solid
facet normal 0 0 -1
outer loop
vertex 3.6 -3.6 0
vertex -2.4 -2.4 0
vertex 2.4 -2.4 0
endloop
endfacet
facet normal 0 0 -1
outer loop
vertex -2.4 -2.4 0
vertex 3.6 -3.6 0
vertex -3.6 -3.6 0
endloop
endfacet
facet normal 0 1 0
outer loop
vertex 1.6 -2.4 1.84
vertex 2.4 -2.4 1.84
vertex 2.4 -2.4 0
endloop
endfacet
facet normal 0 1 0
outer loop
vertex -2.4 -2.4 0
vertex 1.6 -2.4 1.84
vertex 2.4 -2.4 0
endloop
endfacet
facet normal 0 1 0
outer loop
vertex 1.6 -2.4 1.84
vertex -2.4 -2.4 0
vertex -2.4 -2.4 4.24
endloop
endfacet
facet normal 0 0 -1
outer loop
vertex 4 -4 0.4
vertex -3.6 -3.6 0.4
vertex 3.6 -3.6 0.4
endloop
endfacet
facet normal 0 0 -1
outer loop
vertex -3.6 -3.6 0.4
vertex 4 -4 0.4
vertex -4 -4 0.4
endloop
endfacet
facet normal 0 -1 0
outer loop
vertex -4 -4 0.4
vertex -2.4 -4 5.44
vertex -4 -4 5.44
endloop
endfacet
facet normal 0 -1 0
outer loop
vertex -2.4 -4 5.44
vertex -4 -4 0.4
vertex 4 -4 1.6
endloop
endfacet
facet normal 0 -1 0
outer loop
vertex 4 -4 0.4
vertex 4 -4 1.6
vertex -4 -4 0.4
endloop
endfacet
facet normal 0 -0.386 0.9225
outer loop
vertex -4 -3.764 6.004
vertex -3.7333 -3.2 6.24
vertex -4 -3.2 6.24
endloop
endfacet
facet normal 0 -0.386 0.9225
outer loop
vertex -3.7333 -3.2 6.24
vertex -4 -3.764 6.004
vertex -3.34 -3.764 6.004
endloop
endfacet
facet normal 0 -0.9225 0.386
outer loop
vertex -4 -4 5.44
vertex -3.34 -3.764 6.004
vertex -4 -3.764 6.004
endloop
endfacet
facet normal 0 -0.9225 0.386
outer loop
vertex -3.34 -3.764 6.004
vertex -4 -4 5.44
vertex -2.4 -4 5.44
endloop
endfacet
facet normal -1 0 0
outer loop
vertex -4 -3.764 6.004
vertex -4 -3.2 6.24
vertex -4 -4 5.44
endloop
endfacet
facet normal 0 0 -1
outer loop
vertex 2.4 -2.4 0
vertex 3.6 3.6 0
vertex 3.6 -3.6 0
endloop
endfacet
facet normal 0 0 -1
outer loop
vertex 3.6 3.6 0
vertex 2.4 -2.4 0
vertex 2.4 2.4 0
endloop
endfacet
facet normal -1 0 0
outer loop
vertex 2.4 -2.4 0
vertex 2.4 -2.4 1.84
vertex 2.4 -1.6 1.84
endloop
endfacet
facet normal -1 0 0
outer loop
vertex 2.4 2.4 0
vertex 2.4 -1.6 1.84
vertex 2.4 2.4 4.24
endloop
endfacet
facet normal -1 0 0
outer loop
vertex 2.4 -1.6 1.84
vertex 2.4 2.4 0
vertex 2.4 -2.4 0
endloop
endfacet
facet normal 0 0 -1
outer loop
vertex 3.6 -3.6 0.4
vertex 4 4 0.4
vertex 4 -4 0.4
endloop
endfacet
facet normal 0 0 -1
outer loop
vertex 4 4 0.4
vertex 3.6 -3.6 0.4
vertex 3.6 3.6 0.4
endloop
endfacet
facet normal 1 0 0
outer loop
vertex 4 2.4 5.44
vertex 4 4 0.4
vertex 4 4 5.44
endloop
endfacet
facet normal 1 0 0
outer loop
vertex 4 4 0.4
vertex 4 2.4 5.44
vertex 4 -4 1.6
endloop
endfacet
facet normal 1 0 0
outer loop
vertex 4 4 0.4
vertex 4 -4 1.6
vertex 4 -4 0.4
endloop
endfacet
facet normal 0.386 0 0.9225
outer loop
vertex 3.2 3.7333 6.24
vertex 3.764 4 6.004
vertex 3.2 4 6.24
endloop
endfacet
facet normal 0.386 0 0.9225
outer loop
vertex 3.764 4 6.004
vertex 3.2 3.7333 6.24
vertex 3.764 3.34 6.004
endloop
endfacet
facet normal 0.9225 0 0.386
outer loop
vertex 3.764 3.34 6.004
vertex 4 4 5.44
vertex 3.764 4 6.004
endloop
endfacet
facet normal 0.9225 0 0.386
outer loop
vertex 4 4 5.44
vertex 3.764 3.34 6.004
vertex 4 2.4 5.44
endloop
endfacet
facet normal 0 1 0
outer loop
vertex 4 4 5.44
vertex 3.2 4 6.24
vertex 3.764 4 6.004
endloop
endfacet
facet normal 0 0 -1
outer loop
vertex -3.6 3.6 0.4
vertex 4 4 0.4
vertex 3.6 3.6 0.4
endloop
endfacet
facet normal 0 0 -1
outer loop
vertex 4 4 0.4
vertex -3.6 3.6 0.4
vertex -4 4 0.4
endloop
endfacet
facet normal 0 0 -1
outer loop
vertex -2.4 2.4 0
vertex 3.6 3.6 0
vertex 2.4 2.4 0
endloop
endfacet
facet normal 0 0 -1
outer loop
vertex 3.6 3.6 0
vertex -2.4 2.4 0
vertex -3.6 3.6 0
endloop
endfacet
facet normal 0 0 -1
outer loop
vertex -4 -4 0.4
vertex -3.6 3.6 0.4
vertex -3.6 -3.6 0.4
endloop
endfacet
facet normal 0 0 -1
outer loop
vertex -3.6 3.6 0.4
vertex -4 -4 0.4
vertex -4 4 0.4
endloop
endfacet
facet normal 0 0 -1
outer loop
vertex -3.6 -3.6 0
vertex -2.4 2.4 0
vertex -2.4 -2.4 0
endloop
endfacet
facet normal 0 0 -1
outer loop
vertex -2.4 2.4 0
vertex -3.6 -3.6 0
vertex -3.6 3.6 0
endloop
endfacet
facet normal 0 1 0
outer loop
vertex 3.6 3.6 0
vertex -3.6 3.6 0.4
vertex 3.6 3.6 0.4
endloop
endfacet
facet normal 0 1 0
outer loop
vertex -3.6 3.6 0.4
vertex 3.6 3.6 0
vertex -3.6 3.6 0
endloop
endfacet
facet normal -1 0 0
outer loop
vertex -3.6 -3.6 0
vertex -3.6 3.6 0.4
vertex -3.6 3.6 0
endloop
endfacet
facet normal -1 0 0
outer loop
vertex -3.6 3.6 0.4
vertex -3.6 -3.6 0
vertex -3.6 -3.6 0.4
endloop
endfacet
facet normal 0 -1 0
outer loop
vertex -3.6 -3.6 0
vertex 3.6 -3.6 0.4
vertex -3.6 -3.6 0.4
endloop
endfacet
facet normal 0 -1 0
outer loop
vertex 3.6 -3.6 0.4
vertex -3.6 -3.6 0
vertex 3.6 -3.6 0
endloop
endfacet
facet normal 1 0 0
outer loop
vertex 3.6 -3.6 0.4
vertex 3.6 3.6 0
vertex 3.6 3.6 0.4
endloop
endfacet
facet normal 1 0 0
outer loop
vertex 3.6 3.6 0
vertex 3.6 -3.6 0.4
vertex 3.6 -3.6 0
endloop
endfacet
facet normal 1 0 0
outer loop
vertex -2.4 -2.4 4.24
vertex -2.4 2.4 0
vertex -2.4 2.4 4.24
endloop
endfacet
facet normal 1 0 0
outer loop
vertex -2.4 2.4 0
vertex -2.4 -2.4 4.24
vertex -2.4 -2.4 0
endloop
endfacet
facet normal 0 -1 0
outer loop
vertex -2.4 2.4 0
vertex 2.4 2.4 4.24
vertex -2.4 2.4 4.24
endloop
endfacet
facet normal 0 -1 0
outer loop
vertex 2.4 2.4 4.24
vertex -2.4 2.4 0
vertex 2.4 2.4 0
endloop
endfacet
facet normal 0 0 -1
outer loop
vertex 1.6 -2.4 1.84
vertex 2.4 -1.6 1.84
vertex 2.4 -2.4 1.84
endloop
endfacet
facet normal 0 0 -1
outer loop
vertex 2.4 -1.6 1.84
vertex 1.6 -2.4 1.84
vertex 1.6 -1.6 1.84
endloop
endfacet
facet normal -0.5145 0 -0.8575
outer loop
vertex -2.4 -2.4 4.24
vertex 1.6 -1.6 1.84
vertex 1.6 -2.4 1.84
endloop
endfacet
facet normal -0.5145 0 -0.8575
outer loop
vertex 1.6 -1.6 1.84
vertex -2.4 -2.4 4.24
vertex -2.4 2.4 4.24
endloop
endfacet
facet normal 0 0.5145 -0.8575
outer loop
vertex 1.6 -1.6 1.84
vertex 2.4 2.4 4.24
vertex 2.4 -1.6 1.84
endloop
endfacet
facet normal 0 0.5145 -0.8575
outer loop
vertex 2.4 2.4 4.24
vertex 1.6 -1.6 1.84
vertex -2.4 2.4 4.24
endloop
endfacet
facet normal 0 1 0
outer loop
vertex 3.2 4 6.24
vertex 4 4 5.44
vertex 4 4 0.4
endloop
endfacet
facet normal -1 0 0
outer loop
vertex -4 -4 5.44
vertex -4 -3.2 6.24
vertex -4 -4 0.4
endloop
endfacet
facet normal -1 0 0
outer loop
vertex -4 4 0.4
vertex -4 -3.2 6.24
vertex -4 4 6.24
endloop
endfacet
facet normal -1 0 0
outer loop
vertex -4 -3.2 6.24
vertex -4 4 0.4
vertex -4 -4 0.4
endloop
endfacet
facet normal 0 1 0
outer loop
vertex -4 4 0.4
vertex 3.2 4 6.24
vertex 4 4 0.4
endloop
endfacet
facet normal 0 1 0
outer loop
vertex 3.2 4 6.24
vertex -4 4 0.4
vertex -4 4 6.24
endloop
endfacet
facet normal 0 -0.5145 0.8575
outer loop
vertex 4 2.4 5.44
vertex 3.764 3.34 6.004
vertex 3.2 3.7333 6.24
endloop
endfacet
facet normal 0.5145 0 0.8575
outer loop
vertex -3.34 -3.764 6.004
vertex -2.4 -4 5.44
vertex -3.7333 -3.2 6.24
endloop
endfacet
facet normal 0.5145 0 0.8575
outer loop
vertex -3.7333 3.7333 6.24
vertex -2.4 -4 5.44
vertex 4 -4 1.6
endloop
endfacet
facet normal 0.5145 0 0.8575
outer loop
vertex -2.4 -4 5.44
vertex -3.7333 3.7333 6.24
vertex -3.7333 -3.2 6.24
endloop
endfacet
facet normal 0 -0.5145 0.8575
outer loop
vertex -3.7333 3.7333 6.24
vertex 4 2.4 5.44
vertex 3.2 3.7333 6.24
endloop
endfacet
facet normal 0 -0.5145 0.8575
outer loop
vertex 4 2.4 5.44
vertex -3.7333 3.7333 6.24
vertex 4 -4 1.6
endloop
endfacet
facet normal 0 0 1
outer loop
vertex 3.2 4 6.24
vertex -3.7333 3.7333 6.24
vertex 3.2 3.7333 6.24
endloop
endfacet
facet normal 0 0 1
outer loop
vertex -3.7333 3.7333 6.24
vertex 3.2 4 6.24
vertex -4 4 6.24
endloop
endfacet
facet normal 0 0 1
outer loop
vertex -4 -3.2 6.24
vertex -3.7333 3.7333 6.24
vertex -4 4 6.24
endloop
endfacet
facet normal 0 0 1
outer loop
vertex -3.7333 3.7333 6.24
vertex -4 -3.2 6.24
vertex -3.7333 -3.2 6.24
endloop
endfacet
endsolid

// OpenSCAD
// file: s/7825s03.scad
use <../../lib.scad>
function ldraw_lib__s__7825s03() = [
// 0 ~Slope Brick 31  1 x  1 x  0.667 - Side Half
// 0 Name: s\7825s03.dat
// 0 Author: Gerald Lasser [GeraldLasser]
// 0 !LDRAW_ORG Subpart UPDATE 2026-01
// 0 !LICENSE Licensed under CC BY 4.0 : see CAreadme.txt
// 
// 0 BFC CERTIFY CCW
  [0,"BFC","CERTIFY"],
  [0,"BFC","CCW"],
// 
// 0 !HISTORY 2026-01-01 [GeraldLasser] Derived from Philo's 54200
// 0 !HISTORY 2026-01-29 [OrionP] Official Update 2026-01
// 
// 0 // Bottom and Inside
// 4 16 4 0 6 4 0 -6 1 0 -9 1 0 9
  [4,16,4,0,6,4,0,-6,1,0,-9,1,0,9],
// 2 24 4 0 -6 4 0 6
  [2,24,4,0,-6,4,0,6],
// 3 16 4 -4.6 -4 4 -4.6 -6 4 0 -6
  [3,16,4,-4.6,-4,4,-4.6,-6,4,0,-6],
// 4 16 4 0 -6 4 0 6 4 -10.6 6 4 -4.6 -4
  [4,16,4,0,-6,4,0,6,4,-10.6,6,4,-4.6,-4],
// 
// 4 16 0 -1 -10 0 -1 10 1 -1 9 1 -1 -9
  [4,16,0,-1,-10,0,-1,10,1,-1,9,1,-1,-9],
// 2 24 0 -1 10 0 -1 -10
  [2,24,0,-1,10,0,-1,-10],
// 
// 0 // Outside
// 4 16 0 -13.6 6 0 -13.6 10 0 -1 10 0 -4 -10
  [4,16,0,-13.6,6,0,-13.6,10,0,-1,10,0,-4,-10],
// 3 16 0 -1 -10 0 -4 -10 0 -1 10
  [3,16,0,-1,-10,0,-4,-10,0,-1,10],
// 4 16 .59 -15.01 8.35 2 -15.6 9.3333 2 -15.6 10 .59 -15.01 10
  [4,16,.59,-15.01,8.35,2,-15.6,9.3333,2,-15.6,10,.59,-15.01,10],
// 4 16 0 -13.6 6 .59 -15.01 8.35 .59 -15.01 10 0 -13.6 10
  [4,16,0,-13.6,6,.59,-15.01,8.35,.59,-15.01,10,0,-13.6,10],
// 3 16 .59 -15.01 10 2 -15.6 10 0 -13.6 10
  [3,16,.59,-15.01,10,2,-15.6,10,0,-13.6,10],
// 2 24 0 -1 10 0 -13.6 10
  [2,24,0,-1,10,0,-13.6,10],
// 2 24 0 -13.6 6 0 -4 -10
  [2,24,0,-13.6,6,0,-4,-10],
// 2 24 .59 -15.01 8.35 0 -13.6 6
  [2,24,.59,-15.01,8.35,0,-13.6,6],
// 2 24 .59 -15.01 10 0 -13.6 10
  [2,24,.59,-15.01,10,0,-13.6,10],
// 2 24 2 -15.6 9.3333 .59 -15.01 8.35
  [2,24,2,-15.6,9.3333,.59,-15.01,8.35],
// 2 24 .59 -15.01 10 2 -15.6 10
  [2,24,.59,-15.01,10,2,-15.6,10],
// 
// 5 24 .59 -15.01 10 .59 -15.01 8.35 2 -15.6 9.3333 0 -13.6 10
  [5,24,.59,-15.01,10,.59,-15.01,8.35,2,-15.6,9.3333,0,-13.6,10],
// 5 24 0 -13.6 6 0 -13.6 10 .59 -15.01 8.35 0 -1 10
  [5,24,0,-13.6,6,0,-13.6,10,.59,-15.01,8.35,0,-1,10],
// 5 24 2 -15.6 9.3333 2 -15.6 10 .59 -15.01 10 10 -15.6 9.3333
  [5,24,2,-15.6,9.3333,2,-15.6,10,.59,-15.01,10,10,-15.6,9.3333],
];
module ldraw_lib__s__7825s03(step=0, col=false, unit=2/5, alt=false, line=0.2, solid=!$preview)
    makepoly(ldraw_lib__s__7825s03(), step=step, col=col, unit=unit, alt=alt, line=line, solid=solid);
ldraw_lib__s__7825s03(line=0.2);
// file: ../p/rect.scad
use <../lib.scad>
function ldraw_lib__rect() = [
// 0 Rectangle
// 0 Name: rect.dat
// 0 Author: James Jessiman
// 0 !LDRAW_ORG Primitive UPDATE 2010-01
// 0 !LICENSE Licensed under CC BY 4.0 : see CAreadme.txt
// 
// 0 BFC CERTIFY CCW
  [0,"BFC","CERTIFY"],
  [0,"BFC","CCW"],
// 
// 0 !HISTORY 2002-04-05 [hafhead] Added BFC statement
// 0 !HISTORY 2002-04-25 [PTadmin] Official Update 2002-02
// 0 !HISTORY 2007-06-24 [PTadmin] Header formatted for Contributor Agreement
// 0 !HISTORY 2008-07-01 [PTadmin] Official Update 2008-01
// 0 !HISTORY 2010-01-17 [mikeheide] changed winding to CCW
// 0 !HISTORY 2010-04-05 [PTadmin] Official Update 2010-01
// 
// 
// 2 24 1 0 1 -1 0 1
  [2,24,1,0,1,-1,0,1],
// 2 24 -1 0 1 -1 0 -1
  [2,24,-1,0,1,-1,0,-1],
// 2 24 -1 0 -1 1 0 -1
  [2,24,-1,0,-1,1,0,-1],
// 2 24 1 0 -1 1 0 1
  [2,24,1,0,-1,1,0,1],
// 4 16 -1 0 1 -1 0 -1 1 0 -1 1 0 1
  [4,16,-1,0,1,-1,0,-1,1,0,-1,1,0,1],
// 0
];
module ldraw_lib__rect(step=0, col=false, unit=2/5, alt=false, line=0.2, solid=!$preview)
    makepoly(ldraw_lib__rect(), step=step, col=col, unit=unit, alt=alt, line=line, solid=solid);
ldraw_lib__rect(line=0.2);
// file: ../p/box4.scad
use <../lib.scad>
function ldraw_lib__box4() = [
// 0 Box with 4 Faces (2 Parallel Pairs) and All Edges
// 0 Name: box4.dat
// 0 Author: James Jessiman
// 0 !LDRAW_ORG Primitive UPDATE 2012-01
// 0 !LICENSE Licensed under CC BY 4.0 : see CAreadme.txt
// 
// 0 BFC CERTIFY CCW
  [0,"BFC","CERTIFY"],
  [0,"BFC","CCW"],
// 
// 0 !HISTORY 2002-04-03 [sbliss] Modified for BFC compliance
// 0 !HISTORY 2002-04-25 [PTadmin] Official Update 2002-02
// 0 !HISTORY 2007-06-24 [PTadmin] Header formatted for Contributor Agreement
// 0 !HISTORY 2008-07-01 [PTadmin] Official Update 2008-01
// 0 !HISTORY 2012-02-16 [Philo] Changed to CCW
// 0 !HISTORY 2012-03-30 [PTadmin] Official Update 2012-01
// 
// 
// 2 24 1 1 1 -1 1 1
  [2,24,1,1,1,-1,1,1],
// 2 24 -1 1 1 -1 1 -1
  [2,24,-1,1,1,-1,1,-1],
// 2 24 -1 1 -1 1 1 -1
  [2,24,-1,1,-1,1,1,-1],
// 2 24 1 1 -1 1 1 1
  [2,24,1,1,-1,1,1,1],
// 2 24 1 0 1 -1 0 1
  [2,24,1,0,1,-1,0,1],
// 2 24 -1 0 1 -1 0 -1
  [2,24,-1,0,1,-1,0,-1],
// 2 24 -1 0 -1 1 0 -1
  [2,24,-1,0,-1,1,0,-1],
// 2 24 1 0 -1 1 0 1
  [2,24,1,0,-1,1,0,1],
// 2 24 1 0 1 1 1 1
  [2,24,1,0,1,1,1,1],
// 2 24 -1 0 1 -1 1 1
  [2,24,-1,0,1,-1,1,1],
// 2 24 1 0 -1 1 1 -1
  [2,24,1,0,-1,1,1,-1],
// 2 24 -1 0 -1 -1 1 -1
  [2,24,-1,0,-1,-1,1,-1],
// 4 16 -1 1 1 -1 0 1 1 0 1 1 1 1
  [4,16,-1,1,1,-1,0,1,1,0,1,1,1,1],
// 4 16 -1 1 -1 -1 0 -1 -1 0 1 -1 1 1
  [4,16,-1,1,-1,-1,0,-1,-1,0,1,-1,1,1],
// 4 16 1 1 -1 1 0 -1 -1 0 -1 -1 1 -1
  [4,16,1,1,-1,1,0,-1,-1,0,-1,-1,1,-1],
// 4 16 1 1 1 1 0 1 1 0 -1 1 1 -1
  [4,16,1,1,1,1,0,1,1,0,-1,1,1,-1],
];
module ldraw_lib__box4(step=0, col=false, unit=2/5, alt=false, line=0.2, solid=!$preview)
    makepoly(ldraw_lib__box4(), step=step, col=col, unit=unit, alt=alt, line=line, solid=solid);
ldraw_lib__box4(line=0.2);
// file: ../p/box2-5.scad
use <../lib.scad>
function ldraw_lib__box2_5() = [
// 0 Box with 2 Faces without 5 Edges
// 0 Name: box2-5.dat
// 0 Author: Steffen [Steffen]
// 0 !LDRAW_ORG Primitive UPDATE 2003-03
// 0 !LICENSE Licensed under CC BY 4.0 : see CAreadme.txt
// 
// 0 BFC CERTIFY CCW
  [0,"BFC","CERTIFY"],
  [0,"BFC","CCW"],
// 
// 0 !HISTORY 2003-12-19 [PTadmin] Official Update 2003-03
// 0 !HISTORY 2007-06-24 [PTadmin] Header formatted for Contributor Agreement
// 0 !HISTORY 2008-07-01 [PTadmin] Official Update 2008-01
// 
// 
// 2 24 1 1 1 -1 1 1
  [2,24,1,1,1,-1,1,1],
// 2 24 1 1 -1 -1 1 -1
  [2,24,1,1,-1,-1,1,-1],
// 2 24 1 -1 1 -1 -1 1
  [2,24,1,-1,1,-1,-1,1],
// 2 24 -1 -1 1 -1 1 1
  [2,24,-1,-1,1,-1,1,1],
// 2 24 1 -1 1 1 1 1
  [2,24,1,-1,1,1,1,1],
// 2 24 -1 1 -1 -1 1 1
  [2,24,-1,1,-1,-1,1,1],
// 2 24 1 1 -1 1 1 1
  [2,24,1,1,-1,1,1,1],
// 4 16 1 1 1 1 1 -1 -1 1 -1 -1 1 1
  [4,16,1,1,1,1,1,-1,-1,1,-1,-1,1,1],
// 4 16 1 1 1 -1 1 1 -1 -1 1 1 -1 1
  [4,16,1,1,1,-1,1,1,-1,-1,1,1,-1,1],
// 0
];
module ldraw_lib__box2_5(step=0, col=false, unit=2/5, alt=false, line=0.2, solid=!$preview)
    makepoly(ldraw_lib__box2_5(), step=step, col=col, unit=unit, alt=alt, line=line, solid=solid);
ldraw_lib__box2_5(line=0.2);
// main file
use <../lib.scad>
use <../p/box2-5.scad>
use <../p/box4.scad>
use <../p/rect.scad>
use <s/7825s03.scad>
function ldraw_lib__7827() = [
// 0 Slope Brick 31  1 x  1 x  0.667 Double Concave
// 0 Name: 7827.dat
// 0 Author: Gerald Lasser [GeraldLasser]
// 0 !LDRAW_ORG Part UPDATE 2026-01
// 0 !LICENSE Licensed under CC BY 4.0 : see CAreadme.txt
// 
// 0 BFC CERTIFY CCW
  [0,"BFC","CERTIFY"],
  [0,"BFC","CCW"],
// 
// 0 !KEYWORDS Brickowl 977359
// 
// 0 !HISTORY 2026-01-29 [OrionP] Official Update 2026-01
// 
// 1 16 0 0 -10 0 0 -1 0 1 0 1 0 0 s\7825s03.dat
  [1,16,0,0,-10,0,0,-1,0,1,0,1,0,0, ldraw_lib__s__7825s03()],
// 1 16 10 0 0 -1 0 0 0 1 0 0 0 1 s\7825s03.dat
  [1,16,10,0,0,-1,0,0,0,1,0,0,0,1, ldraw_lib__s__7825s03()],
// 
// 0 // Inside and Bottom
// 4 16 -9 -1 9 -10 -1 10 10 -1 10 9 -1 9
  [4,16,-9,-1,9,-10,-1,10,10,-1,10,9,-1,9],
// 4 16 9 0 9 6 0 6 -6 0 6 -9 0 9
  [4,16,9,0,9,6,0,6,-6,0,6,-9,0,9],
// 4 16 -10 -1 -10 -10 -1 10 -9 -1 9 -9 -1 -9
  [4,16,-10,-1,-10,-10,-1,10,-9,-1,9,-9,-1,-9],
// 4 16 -6 0 6 -6 0 -6 -9 0 -9 -9 0 9
  [4,16,-6,0,6,-6,0,-6,-9,0,-9,-9,0,9],
// 1 16 0 -1 0 9 0 0 0 1 0 0 0 9 box4.dat
  [1,16,0,-1,0,9,0,0,0,1,0,0,0,9, ldraw_lib__box4()],
// 0 BFC INVERTNEXT
  [0,"BFC","INVERTNEXT"],
// 1 16 0 -5.3 0 0 -6 0 5.3 0 0 0 0 6 box2-5.dat
  [1,16,0,-5.3,0,0,-6,0,5.3,0,0,0,0,6, ldraw_lib__box2_5()],
// 
// 1 16 5 -4.6 -5 1 0 0 0 -1 0 0 0 1 rect.dat
  [1,16,5,-4.6,-5,1,0,0,0,-1,0,0,0,1, ldraw_lib__rect()],
// 4 16 -6 -10.6 -6 -6 -10.6 6 4 -4.6 -4 4 -4.6 -6
  [4,16,-6,-10.6,-6,-6,-10.6,6,4,-4.6,-4,4,-4.6,-6],
// 4 16 6 -4.6 -4 4 -4.6 -4 -6 -10.6 6 6 -10.6 6
  [4,16,6,-4.6,-4,4,-4.6,-4,-6,-10.6,6,6,-10.6,6],
// 2 24 4 -4.6 -4 -6 -10.6 6
  [2,24,4,-4.6,-4,-6,-10.6,6],
// 2 24 4 -4.6 -6 -6 -10.6 -6
  [2,24,4,-4.6,-6,-6,-10.6,-6],
// 2 24 6 -4.6 -4 6 -10.6 6
  [2,24,6,-4.6,-4,6,-10.6,6],
// 2 24 6 -4.6 -6 6 0 -6
  [2,24,6,-4.6,-6,6,0,-6],
// 
// 0 // Outside
// 3 16 8 -15.6 10 10 -13.6 10 10 -1 10
  [3,16,8,-15.6,10,10,-13.6,10,10,-1,10],
// 3 16 -10 -13.6 -10 -10 -15.6 -8 -10 -1 -10
  [3,16,-10,-13.6,-10,-10,-15.6,-8,-10,-1,-10],
// 4 16 -10 -1 10 -10 -1 -10 -10 -15.6 -8 -10 -15.6 10
  [4,16,-10,-1,10,-10,-1,-10,-10,-15.6,-8,-10,-15.6,10],
// 4 16 -10 -1 10 -10 -15.6 10 8 -15.6 10 10 -1 10
  [4,16,-10,-1,10,-10,-15.6,10,8,-15.6,10,10,-1,10],
// 
// 3 16 10 -13.6 6 9.41 -15.01 8.35 8 -15.6 9.3333
  [3,16,10,-13.6,6,9.41,-15.01,8.35,8,-15.6,9.3333],
// 3 16 -8.35 -15.01 -9.41 -6 -13.6 -10 -9.3333 -15.6 -8
  [3,16,-8.35,-15.01,-9.41,-6,-13.6,-10,-9.3333,-15.6,-8],
// 4 16 -9.3333 -15.6 9.3333 -9.3333 -15.6 -8 -6 -13.6 -10 10 -4 -10
  [4,16,-9.3333,-15.6,9.3333,-9.3333,-15.6,-8,-6,-13.6,-10,10,-4,-10],
// 4 16 8 -15.6 9.3333 -9.3333 -15.6 9.3333 10 -4 -10 10 -13.6 6
  [4,16,8,-15.6,9.3333,-9.3333,-15.6,9.3333,10,-4,-10,10,-13.6,6],
// 4 16 -9.3333 -15.6 9.3333 8 -15.6 9.3333 8 -15.6 10 -10 -15.6 10
  [4,16,-9.3333,-15.6,9.3333,8,-15.6,9.3333,8,-15.6,10,-10,-15.6,10],
// 4 16 -9.3333 -15.6 -8 -9.3333 -15.6 9.3333 -10 -15.6 10 -10 -15.6 -8
  [4,16,-9.3333,-15.6,-8,-9.3333,-15.6,9.3333,-10,-15.6,10,-10,-15.6,-8],
// 
// 2 24 -10 -15.6 10 -10 -1 10
  [2,24,-10,-15.6,10,-10,-1,10],
// 2 24 -10 -1 10 -10 -1 -10
  [2,24,-10,-1,10,-10,-1,-10],
// 2 24 -10 -1 10 10 -1 10
  [2,24,-10,-1,10,10,-1,10],
// 2 24 -10 -15.6 10 -10 -15.6 -8
  [2,24,-10,-15.6,10,-10,-15.6,-8],
// 2 24 8 -15.6 10 -10 -15.6 10
  [2,24,8,-15.6,10,-10,-15.6,10],
// 2 24 -9.3333 -15.6 9.3333 -9.3333 -15.6 -8
  [2,24,-9.3333,-15.6,9.3333,-9.3333,-15.6,-8],
// 2 24 8 -15.6 9.3333 -9.3333 -15.6 9.3333
  [2,24,8,-15.6,9.3333,-9.3333,-15.6,9.3333],
// 2 24 10 -4 -10 -9.3333 -15.6 9.3333
  [2,24,10,-4,-10,-9.3333,-15.6,9.3333],
// 2 24 10 -4 -10 10 -1 -10
  [2,24,10,-4,-10,10,-1,-10],
];
module ldraw_lib__7827(step=0, col=false, unit=2/5, alt=false, line=0.2, solid=!$preview)
    makepoly(ldraw_lib__7827(), step=step, col=col, unit=unit, alt=alt, line=line, solid=solid);
ldraw_lib__7827(line=0.2);
